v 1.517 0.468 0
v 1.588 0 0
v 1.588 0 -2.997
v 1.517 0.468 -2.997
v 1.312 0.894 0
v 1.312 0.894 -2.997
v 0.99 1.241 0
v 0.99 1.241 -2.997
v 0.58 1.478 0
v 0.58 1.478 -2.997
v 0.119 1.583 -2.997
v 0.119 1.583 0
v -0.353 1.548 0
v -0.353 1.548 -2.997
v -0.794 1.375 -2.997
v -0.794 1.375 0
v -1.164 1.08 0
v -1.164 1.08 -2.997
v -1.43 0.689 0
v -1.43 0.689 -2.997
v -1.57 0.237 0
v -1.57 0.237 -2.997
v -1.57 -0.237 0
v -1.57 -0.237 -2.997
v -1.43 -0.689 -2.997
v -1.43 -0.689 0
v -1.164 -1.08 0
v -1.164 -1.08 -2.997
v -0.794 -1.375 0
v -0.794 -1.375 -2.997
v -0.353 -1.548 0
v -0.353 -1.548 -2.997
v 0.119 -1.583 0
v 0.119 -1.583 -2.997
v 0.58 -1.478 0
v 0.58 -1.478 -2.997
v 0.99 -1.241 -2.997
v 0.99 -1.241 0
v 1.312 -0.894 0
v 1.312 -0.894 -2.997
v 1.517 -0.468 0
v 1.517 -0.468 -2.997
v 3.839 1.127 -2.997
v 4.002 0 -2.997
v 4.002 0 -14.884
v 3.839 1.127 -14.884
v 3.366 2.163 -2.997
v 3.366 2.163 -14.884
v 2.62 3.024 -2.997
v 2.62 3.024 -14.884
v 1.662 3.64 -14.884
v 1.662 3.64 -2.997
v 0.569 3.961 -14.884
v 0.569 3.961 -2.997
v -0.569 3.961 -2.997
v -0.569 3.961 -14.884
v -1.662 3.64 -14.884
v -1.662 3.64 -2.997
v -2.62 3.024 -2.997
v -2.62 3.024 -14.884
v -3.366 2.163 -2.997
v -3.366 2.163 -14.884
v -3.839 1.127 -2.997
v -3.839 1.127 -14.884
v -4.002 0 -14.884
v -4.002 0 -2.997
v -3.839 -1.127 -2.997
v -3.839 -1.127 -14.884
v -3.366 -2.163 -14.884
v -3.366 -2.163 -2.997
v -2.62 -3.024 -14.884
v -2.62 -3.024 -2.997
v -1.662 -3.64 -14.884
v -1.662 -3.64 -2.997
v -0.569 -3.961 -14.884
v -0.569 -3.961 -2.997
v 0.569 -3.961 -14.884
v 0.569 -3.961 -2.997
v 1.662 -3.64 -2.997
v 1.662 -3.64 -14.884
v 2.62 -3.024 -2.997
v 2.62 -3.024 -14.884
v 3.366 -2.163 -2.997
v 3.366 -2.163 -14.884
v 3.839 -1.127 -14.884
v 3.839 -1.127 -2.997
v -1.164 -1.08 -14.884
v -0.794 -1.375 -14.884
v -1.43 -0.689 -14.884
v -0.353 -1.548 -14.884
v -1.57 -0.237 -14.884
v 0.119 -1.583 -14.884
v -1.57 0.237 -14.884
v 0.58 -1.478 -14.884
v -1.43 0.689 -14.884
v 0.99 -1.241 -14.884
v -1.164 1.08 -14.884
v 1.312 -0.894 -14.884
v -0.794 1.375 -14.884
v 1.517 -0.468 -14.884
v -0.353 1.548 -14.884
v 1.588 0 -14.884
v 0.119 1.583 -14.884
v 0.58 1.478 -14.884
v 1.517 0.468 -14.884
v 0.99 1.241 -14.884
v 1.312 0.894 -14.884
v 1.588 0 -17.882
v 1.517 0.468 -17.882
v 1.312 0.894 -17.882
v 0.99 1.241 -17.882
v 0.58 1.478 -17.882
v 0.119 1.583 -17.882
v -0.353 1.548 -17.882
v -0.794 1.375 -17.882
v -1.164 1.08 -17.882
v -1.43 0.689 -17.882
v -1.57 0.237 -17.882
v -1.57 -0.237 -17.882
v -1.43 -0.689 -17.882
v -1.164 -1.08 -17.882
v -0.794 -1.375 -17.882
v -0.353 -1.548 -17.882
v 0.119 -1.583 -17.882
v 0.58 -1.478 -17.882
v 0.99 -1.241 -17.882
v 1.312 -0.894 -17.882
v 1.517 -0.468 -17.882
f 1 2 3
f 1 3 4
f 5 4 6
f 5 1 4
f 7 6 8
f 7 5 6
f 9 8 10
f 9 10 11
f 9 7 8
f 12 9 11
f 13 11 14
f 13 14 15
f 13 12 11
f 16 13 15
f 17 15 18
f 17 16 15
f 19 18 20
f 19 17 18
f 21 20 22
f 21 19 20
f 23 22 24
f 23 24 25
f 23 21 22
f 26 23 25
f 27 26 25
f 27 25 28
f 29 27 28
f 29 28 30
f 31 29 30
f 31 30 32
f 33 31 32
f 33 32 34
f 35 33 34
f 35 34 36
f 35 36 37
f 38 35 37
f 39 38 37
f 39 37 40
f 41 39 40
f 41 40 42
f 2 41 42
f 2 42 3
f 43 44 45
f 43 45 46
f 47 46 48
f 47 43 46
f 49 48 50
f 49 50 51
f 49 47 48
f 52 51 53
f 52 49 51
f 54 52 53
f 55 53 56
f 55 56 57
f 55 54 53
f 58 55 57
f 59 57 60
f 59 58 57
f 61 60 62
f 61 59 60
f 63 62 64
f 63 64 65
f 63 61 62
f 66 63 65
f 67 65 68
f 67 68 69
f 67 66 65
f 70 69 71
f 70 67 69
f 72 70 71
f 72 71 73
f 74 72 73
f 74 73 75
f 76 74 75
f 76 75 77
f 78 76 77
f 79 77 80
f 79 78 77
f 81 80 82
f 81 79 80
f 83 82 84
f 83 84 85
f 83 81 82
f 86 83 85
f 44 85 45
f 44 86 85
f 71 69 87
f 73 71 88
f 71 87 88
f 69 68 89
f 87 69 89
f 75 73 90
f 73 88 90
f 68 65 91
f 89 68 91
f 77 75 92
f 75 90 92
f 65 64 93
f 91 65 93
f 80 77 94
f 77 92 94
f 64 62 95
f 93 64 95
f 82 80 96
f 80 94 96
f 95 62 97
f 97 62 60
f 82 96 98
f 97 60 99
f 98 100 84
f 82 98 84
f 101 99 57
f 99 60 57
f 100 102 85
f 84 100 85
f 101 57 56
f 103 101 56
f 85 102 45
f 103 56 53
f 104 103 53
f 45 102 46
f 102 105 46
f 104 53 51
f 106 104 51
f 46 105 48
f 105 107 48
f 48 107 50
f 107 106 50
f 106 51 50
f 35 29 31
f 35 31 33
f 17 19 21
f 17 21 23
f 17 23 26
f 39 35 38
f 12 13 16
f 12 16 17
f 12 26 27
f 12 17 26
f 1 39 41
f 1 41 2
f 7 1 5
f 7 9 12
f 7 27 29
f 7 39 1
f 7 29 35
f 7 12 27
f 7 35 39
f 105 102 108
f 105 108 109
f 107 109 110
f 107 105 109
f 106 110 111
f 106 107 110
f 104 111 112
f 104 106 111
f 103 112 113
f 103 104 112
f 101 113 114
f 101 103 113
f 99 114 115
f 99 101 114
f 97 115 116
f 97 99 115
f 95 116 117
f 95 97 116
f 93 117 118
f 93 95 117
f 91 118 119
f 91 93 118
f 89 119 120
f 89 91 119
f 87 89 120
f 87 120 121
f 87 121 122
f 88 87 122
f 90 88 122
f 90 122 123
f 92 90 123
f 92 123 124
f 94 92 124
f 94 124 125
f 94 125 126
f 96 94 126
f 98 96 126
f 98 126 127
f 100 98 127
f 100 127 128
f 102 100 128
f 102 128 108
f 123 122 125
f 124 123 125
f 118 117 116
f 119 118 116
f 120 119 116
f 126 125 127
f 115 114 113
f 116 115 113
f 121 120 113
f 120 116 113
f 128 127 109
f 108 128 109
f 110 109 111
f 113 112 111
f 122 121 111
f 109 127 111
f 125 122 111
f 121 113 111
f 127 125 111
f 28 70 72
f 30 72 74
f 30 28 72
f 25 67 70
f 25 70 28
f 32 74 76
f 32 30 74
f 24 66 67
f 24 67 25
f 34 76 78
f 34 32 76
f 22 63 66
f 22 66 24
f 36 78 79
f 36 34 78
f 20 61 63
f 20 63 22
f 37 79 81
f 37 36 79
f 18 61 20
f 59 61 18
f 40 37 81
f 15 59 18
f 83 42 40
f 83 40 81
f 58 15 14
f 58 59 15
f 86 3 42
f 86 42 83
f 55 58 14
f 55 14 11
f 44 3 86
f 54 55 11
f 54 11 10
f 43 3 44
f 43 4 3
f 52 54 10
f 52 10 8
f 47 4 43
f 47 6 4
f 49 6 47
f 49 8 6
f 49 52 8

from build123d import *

# Parameters (mm, degrees)
SKETCH1_R           = 1.5875
BOSS_EXTRUDE1_DEPTH = 17.8816
SKETCH2_R           = 4.0015
BOSS_EXTRUDE2_DEPTH = 11.8872


with BuildPart() as part:
    # Sketch1 → Boss-Extrude1 (new body)
    with BuildSketch(Plane.XY):
        Circle(SKETCH1_R)
    extrude(amount=-BOSS_EXTRUDE1_DEPTH)

    # Sketch2 → Boss-Extrude2 (add)
    with BuildSketch(Plane.XY.offset(-2.9972)):
        Circle(SKETCH2_R)
    extrude(amount=-BOSS_EXTRUDE2_DEPTH)


solid = part.part
